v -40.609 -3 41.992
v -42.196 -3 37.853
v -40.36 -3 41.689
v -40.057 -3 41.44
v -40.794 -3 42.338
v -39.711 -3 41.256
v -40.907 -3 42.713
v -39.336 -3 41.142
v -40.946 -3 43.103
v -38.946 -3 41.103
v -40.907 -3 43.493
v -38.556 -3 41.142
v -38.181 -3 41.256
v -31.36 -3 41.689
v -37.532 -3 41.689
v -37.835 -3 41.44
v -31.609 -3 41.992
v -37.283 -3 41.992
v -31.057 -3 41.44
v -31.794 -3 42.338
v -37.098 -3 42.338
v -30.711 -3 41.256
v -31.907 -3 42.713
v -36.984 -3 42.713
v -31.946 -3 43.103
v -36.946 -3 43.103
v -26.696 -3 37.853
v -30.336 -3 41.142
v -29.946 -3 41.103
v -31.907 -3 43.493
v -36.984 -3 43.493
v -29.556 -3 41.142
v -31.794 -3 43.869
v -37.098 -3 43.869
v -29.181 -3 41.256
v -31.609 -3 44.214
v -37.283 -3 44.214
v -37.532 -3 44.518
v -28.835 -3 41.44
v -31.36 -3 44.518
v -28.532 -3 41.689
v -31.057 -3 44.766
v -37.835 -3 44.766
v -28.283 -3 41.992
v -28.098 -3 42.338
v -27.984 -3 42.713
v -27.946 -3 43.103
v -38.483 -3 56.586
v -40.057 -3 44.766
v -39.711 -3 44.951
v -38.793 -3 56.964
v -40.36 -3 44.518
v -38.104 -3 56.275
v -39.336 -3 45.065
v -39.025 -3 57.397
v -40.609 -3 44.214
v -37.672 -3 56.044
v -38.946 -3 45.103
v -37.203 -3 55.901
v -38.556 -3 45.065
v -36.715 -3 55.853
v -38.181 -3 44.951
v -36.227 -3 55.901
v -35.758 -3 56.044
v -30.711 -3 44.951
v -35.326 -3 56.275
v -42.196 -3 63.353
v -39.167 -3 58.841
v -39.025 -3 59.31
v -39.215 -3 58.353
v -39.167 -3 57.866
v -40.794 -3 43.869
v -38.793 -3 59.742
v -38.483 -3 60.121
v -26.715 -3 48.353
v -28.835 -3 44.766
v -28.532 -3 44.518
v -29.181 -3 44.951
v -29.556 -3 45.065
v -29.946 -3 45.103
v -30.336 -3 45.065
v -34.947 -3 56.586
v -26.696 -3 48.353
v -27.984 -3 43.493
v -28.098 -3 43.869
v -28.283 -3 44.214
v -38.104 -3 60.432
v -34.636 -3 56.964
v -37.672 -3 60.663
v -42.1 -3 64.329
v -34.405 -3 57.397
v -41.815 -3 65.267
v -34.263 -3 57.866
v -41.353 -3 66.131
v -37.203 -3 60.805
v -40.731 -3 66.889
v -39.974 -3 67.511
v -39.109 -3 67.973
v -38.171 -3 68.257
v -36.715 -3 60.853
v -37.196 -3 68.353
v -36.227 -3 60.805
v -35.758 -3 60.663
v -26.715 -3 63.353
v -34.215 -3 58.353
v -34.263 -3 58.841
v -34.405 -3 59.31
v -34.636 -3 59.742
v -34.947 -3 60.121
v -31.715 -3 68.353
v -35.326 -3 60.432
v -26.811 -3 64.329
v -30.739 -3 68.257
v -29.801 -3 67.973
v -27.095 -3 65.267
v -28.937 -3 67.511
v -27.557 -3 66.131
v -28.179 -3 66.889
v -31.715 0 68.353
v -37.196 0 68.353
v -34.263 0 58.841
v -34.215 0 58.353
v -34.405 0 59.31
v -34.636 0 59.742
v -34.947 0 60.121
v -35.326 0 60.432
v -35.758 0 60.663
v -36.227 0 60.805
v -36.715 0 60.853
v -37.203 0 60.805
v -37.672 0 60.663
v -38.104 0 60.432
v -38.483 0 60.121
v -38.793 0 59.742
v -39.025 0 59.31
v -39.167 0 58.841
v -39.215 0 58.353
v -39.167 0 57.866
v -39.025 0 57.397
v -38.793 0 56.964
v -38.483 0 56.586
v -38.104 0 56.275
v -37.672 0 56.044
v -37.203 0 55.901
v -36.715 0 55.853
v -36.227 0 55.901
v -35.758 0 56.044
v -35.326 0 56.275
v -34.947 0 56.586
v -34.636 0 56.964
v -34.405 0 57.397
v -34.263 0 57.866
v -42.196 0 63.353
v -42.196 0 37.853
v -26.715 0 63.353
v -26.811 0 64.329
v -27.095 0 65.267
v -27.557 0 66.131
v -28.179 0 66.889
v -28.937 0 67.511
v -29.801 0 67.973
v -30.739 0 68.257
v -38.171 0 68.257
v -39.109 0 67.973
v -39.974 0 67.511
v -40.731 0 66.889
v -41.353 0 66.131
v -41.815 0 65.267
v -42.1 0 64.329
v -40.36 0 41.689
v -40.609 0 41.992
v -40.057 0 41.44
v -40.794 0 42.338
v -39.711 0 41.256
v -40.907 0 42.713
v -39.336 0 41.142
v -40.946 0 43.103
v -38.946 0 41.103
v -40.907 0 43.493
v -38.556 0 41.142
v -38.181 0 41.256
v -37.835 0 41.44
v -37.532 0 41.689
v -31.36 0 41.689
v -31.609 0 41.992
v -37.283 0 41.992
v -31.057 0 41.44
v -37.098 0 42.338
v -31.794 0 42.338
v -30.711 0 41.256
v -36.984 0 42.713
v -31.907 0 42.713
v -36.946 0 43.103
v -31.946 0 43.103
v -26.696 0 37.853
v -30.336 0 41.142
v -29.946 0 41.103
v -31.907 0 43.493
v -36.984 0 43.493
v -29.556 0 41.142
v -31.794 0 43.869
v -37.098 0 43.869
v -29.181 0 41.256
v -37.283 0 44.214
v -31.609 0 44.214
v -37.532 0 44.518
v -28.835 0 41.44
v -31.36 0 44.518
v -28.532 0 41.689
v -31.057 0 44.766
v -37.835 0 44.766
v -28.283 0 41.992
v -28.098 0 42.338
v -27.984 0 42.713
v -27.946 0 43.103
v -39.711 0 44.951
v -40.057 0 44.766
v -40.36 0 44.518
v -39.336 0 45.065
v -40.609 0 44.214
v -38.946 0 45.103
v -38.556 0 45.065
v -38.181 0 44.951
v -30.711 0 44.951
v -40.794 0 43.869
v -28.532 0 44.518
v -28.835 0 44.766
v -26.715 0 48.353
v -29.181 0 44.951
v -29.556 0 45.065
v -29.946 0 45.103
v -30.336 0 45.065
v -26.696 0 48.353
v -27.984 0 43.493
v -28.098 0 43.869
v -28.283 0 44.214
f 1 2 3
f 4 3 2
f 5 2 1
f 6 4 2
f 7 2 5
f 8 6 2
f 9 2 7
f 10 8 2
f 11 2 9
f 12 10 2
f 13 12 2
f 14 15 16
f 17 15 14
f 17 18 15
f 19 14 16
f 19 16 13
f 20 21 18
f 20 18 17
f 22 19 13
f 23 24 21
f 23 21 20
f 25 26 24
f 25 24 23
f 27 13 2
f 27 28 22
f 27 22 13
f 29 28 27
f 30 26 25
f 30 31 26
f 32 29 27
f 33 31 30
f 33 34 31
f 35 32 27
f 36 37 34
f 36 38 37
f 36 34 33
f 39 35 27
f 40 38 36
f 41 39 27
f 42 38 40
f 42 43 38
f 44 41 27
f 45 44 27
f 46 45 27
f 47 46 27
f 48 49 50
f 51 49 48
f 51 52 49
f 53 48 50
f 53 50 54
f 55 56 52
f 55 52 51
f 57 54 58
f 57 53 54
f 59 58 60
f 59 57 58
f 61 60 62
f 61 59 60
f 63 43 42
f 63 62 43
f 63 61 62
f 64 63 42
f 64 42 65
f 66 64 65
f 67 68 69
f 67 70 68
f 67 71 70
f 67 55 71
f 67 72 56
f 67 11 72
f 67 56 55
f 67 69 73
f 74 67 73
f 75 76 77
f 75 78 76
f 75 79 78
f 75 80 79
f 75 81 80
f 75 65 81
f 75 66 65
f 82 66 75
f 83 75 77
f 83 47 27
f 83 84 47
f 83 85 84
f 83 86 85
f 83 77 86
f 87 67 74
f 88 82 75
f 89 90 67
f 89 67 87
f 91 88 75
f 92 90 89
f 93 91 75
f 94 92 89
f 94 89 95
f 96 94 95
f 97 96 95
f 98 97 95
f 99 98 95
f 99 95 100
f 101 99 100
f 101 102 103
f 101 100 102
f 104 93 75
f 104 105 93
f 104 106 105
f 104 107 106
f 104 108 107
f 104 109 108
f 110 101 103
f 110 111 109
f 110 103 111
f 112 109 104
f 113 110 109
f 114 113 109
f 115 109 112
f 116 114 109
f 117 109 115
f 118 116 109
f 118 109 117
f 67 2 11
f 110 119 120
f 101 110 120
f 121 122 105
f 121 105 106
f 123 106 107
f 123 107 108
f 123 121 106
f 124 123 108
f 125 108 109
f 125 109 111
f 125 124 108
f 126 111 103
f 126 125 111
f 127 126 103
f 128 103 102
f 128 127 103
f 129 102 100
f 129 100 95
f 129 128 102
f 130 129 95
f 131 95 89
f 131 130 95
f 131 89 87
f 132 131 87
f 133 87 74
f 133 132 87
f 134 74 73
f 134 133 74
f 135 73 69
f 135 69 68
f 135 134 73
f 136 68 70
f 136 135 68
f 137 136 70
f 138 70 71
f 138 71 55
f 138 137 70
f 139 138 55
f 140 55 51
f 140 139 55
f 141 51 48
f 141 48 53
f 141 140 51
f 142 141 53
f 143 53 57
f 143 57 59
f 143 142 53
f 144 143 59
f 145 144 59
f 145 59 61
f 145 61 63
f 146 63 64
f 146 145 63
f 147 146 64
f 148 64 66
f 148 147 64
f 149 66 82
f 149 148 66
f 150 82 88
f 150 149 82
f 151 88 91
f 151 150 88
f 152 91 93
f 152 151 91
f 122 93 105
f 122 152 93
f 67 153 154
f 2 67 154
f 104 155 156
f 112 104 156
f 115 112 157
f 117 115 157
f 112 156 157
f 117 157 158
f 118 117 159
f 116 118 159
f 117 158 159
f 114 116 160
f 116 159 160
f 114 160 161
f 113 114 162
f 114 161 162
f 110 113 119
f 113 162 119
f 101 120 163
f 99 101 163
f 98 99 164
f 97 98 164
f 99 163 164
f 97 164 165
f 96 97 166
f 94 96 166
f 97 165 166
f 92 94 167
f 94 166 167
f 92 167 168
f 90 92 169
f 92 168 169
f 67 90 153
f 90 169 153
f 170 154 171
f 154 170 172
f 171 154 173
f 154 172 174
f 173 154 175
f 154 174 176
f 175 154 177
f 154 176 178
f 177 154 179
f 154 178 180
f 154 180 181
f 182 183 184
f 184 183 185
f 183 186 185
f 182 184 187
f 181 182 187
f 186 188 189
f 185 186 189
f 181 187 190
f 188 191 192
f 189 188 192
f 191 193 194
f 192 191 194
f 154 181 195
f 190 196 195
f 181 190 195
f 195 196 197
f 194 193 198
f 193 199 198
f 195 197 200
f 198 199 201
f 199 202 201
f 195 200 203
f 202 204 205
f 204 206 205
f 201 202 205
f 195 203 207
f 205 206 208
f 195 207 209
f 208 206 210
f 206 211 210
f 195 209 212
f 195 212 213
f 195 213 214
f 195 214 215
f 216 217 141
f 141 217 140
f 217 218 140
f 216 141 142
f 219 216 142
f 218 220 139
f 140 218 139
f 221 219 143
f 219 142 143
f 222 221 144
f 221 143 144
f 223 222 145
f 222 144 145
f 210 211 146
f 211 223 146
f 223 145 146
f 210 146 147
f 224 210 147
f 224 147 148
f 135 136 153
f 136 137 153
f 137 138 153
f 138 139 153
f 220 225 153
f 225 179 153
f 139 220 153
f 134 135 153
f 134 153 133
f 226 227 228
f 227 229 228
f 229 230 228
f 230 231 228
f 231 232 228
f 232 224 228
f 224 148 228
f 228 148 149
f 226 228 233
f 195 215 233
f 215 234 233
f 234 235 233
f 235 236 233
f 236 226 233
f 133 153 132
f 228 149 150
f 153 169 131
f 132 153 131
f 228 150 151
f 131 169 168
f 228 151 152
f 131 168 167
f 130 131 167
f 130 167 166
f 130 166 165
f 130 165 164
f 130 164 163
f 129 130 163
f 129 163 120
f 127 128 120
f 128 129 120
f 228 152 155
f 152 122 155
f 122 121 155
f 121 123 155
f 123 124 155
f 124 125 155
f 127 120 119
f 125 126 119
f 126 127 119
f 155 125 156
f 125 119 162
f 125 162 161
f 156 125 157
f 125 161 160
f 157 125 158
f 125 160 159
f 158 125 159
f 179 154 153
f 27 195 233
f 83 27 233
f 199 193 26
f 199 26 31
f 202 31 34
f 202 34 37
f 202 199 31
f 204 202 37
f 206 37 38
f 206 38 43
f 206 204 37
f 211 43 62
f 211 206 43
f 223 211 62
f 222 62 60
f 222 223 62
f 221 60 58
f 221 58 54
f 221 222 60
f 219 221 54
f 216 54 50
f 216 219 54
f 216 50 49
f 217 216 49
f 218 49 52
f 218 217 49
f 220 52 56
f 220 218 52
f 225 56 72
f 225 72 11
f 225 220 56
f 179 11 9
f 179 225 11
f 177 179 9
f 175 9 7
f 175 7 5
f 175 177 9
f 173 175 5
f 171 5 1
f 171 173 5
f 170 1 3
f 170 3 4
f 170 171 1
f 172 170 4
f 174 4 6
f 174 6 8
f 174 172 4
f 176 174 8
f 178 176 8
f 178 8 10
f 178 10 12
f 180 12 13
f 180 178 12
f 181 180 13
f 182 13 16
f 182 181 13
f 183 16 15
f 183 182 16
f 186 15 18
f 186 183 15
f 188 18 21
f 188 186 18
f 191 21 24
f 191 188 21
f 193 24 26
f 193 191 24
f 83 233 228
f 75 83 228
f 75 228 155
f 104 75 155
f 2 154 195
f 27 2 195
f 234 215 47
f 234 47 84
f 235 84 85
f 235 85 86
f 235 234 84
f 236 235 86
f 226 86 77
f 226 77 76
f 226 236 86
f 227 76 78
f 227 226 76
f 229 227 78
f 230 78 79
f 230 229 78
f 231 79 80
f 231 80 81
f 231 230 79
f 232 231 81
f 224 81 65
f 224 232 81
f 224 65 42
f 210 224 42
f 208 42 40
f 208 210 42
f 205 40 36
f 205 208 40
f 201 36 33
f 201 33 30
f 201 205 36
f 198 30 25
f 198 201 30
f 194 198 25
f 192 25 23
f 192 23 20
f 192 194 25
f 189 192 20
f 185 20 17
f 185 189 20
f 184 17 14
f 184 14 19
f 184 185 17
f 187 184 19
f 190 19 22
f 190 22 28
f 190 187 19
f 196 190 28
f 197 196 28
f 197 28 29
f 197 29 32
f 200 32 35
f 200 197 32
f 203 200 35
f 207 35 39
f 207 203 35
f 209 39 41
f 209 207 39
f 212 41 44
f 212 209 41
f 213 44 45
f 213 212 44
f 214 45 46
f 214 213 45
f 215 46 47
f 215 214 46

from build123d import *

# Parameters (mm, degrees)
F0_W     = 0.018924
F0_H     = 10.5
F0_R     = 2
F0_R_2   = 2.5
F1_DEPTH = 3


with BuildPart() as f1:
    # F0 (on Front) → F1 (new body)
    with BuildSketch(Plane.XZ):
        with Locations((-26.705362, 43.103301)):
            Rectangle(F0_W, F0_H)
        with BuildLine():
            Line((-26.714824, 37.853301), (-26.714824, 48.353301))
            Line((-26.714824, 48.353301), (-36.544182, 48.353301))
            ThreePointArc((-36.544182, 48.353301), (-40.513356, 46.970414), (-42.1959, 43.118692))
            Line((-42.1959, 43.118692), (-42.1959, 37.853301))
            Line((-42.1959, 37.853301), (-26.714824, 37.853301))
        make_face()
        with Locations((-38.9459, 43.103301)):
            Circle(F0_R, mode=Mode.SUBTRACT)
        with Locations((-29.9459, 43.103301)):
            Circle(F0_R, mode=Mode.SUBTRACT)
        with BuildLine():
            Line((-36.544182, 48.353301), (-26.714824, 48.353301))
            Line((-26.714824, 48.353301), (-26.714824, 63.353301))
            ThreePointArc((-26.714824, 63.353301), (-28.17929, 66.888834), (-31.714824, 68.353301))
            Line((-31.714824, 68.353301), (-37.1959, 68.353301))
            ThreePointArc((-37.1959, 68.353301), (-40.731434, 66.888834), (-42.1959, 63.353301))
            Line((-42.1959, 63.353301), (-42.1959, 43.118692))
            ThreePointArc((-42.1959, 43.118692), (-40.513356, 46.970414), (-36.544182, 48.353301))
        make_face()
        with Locations((-36.714824, 58.353301)):
            Circle(F0_R_2, mode=Mode.SUBTRACT)
    extrude(amount=F1_DEPTH)


solid = f1.part
